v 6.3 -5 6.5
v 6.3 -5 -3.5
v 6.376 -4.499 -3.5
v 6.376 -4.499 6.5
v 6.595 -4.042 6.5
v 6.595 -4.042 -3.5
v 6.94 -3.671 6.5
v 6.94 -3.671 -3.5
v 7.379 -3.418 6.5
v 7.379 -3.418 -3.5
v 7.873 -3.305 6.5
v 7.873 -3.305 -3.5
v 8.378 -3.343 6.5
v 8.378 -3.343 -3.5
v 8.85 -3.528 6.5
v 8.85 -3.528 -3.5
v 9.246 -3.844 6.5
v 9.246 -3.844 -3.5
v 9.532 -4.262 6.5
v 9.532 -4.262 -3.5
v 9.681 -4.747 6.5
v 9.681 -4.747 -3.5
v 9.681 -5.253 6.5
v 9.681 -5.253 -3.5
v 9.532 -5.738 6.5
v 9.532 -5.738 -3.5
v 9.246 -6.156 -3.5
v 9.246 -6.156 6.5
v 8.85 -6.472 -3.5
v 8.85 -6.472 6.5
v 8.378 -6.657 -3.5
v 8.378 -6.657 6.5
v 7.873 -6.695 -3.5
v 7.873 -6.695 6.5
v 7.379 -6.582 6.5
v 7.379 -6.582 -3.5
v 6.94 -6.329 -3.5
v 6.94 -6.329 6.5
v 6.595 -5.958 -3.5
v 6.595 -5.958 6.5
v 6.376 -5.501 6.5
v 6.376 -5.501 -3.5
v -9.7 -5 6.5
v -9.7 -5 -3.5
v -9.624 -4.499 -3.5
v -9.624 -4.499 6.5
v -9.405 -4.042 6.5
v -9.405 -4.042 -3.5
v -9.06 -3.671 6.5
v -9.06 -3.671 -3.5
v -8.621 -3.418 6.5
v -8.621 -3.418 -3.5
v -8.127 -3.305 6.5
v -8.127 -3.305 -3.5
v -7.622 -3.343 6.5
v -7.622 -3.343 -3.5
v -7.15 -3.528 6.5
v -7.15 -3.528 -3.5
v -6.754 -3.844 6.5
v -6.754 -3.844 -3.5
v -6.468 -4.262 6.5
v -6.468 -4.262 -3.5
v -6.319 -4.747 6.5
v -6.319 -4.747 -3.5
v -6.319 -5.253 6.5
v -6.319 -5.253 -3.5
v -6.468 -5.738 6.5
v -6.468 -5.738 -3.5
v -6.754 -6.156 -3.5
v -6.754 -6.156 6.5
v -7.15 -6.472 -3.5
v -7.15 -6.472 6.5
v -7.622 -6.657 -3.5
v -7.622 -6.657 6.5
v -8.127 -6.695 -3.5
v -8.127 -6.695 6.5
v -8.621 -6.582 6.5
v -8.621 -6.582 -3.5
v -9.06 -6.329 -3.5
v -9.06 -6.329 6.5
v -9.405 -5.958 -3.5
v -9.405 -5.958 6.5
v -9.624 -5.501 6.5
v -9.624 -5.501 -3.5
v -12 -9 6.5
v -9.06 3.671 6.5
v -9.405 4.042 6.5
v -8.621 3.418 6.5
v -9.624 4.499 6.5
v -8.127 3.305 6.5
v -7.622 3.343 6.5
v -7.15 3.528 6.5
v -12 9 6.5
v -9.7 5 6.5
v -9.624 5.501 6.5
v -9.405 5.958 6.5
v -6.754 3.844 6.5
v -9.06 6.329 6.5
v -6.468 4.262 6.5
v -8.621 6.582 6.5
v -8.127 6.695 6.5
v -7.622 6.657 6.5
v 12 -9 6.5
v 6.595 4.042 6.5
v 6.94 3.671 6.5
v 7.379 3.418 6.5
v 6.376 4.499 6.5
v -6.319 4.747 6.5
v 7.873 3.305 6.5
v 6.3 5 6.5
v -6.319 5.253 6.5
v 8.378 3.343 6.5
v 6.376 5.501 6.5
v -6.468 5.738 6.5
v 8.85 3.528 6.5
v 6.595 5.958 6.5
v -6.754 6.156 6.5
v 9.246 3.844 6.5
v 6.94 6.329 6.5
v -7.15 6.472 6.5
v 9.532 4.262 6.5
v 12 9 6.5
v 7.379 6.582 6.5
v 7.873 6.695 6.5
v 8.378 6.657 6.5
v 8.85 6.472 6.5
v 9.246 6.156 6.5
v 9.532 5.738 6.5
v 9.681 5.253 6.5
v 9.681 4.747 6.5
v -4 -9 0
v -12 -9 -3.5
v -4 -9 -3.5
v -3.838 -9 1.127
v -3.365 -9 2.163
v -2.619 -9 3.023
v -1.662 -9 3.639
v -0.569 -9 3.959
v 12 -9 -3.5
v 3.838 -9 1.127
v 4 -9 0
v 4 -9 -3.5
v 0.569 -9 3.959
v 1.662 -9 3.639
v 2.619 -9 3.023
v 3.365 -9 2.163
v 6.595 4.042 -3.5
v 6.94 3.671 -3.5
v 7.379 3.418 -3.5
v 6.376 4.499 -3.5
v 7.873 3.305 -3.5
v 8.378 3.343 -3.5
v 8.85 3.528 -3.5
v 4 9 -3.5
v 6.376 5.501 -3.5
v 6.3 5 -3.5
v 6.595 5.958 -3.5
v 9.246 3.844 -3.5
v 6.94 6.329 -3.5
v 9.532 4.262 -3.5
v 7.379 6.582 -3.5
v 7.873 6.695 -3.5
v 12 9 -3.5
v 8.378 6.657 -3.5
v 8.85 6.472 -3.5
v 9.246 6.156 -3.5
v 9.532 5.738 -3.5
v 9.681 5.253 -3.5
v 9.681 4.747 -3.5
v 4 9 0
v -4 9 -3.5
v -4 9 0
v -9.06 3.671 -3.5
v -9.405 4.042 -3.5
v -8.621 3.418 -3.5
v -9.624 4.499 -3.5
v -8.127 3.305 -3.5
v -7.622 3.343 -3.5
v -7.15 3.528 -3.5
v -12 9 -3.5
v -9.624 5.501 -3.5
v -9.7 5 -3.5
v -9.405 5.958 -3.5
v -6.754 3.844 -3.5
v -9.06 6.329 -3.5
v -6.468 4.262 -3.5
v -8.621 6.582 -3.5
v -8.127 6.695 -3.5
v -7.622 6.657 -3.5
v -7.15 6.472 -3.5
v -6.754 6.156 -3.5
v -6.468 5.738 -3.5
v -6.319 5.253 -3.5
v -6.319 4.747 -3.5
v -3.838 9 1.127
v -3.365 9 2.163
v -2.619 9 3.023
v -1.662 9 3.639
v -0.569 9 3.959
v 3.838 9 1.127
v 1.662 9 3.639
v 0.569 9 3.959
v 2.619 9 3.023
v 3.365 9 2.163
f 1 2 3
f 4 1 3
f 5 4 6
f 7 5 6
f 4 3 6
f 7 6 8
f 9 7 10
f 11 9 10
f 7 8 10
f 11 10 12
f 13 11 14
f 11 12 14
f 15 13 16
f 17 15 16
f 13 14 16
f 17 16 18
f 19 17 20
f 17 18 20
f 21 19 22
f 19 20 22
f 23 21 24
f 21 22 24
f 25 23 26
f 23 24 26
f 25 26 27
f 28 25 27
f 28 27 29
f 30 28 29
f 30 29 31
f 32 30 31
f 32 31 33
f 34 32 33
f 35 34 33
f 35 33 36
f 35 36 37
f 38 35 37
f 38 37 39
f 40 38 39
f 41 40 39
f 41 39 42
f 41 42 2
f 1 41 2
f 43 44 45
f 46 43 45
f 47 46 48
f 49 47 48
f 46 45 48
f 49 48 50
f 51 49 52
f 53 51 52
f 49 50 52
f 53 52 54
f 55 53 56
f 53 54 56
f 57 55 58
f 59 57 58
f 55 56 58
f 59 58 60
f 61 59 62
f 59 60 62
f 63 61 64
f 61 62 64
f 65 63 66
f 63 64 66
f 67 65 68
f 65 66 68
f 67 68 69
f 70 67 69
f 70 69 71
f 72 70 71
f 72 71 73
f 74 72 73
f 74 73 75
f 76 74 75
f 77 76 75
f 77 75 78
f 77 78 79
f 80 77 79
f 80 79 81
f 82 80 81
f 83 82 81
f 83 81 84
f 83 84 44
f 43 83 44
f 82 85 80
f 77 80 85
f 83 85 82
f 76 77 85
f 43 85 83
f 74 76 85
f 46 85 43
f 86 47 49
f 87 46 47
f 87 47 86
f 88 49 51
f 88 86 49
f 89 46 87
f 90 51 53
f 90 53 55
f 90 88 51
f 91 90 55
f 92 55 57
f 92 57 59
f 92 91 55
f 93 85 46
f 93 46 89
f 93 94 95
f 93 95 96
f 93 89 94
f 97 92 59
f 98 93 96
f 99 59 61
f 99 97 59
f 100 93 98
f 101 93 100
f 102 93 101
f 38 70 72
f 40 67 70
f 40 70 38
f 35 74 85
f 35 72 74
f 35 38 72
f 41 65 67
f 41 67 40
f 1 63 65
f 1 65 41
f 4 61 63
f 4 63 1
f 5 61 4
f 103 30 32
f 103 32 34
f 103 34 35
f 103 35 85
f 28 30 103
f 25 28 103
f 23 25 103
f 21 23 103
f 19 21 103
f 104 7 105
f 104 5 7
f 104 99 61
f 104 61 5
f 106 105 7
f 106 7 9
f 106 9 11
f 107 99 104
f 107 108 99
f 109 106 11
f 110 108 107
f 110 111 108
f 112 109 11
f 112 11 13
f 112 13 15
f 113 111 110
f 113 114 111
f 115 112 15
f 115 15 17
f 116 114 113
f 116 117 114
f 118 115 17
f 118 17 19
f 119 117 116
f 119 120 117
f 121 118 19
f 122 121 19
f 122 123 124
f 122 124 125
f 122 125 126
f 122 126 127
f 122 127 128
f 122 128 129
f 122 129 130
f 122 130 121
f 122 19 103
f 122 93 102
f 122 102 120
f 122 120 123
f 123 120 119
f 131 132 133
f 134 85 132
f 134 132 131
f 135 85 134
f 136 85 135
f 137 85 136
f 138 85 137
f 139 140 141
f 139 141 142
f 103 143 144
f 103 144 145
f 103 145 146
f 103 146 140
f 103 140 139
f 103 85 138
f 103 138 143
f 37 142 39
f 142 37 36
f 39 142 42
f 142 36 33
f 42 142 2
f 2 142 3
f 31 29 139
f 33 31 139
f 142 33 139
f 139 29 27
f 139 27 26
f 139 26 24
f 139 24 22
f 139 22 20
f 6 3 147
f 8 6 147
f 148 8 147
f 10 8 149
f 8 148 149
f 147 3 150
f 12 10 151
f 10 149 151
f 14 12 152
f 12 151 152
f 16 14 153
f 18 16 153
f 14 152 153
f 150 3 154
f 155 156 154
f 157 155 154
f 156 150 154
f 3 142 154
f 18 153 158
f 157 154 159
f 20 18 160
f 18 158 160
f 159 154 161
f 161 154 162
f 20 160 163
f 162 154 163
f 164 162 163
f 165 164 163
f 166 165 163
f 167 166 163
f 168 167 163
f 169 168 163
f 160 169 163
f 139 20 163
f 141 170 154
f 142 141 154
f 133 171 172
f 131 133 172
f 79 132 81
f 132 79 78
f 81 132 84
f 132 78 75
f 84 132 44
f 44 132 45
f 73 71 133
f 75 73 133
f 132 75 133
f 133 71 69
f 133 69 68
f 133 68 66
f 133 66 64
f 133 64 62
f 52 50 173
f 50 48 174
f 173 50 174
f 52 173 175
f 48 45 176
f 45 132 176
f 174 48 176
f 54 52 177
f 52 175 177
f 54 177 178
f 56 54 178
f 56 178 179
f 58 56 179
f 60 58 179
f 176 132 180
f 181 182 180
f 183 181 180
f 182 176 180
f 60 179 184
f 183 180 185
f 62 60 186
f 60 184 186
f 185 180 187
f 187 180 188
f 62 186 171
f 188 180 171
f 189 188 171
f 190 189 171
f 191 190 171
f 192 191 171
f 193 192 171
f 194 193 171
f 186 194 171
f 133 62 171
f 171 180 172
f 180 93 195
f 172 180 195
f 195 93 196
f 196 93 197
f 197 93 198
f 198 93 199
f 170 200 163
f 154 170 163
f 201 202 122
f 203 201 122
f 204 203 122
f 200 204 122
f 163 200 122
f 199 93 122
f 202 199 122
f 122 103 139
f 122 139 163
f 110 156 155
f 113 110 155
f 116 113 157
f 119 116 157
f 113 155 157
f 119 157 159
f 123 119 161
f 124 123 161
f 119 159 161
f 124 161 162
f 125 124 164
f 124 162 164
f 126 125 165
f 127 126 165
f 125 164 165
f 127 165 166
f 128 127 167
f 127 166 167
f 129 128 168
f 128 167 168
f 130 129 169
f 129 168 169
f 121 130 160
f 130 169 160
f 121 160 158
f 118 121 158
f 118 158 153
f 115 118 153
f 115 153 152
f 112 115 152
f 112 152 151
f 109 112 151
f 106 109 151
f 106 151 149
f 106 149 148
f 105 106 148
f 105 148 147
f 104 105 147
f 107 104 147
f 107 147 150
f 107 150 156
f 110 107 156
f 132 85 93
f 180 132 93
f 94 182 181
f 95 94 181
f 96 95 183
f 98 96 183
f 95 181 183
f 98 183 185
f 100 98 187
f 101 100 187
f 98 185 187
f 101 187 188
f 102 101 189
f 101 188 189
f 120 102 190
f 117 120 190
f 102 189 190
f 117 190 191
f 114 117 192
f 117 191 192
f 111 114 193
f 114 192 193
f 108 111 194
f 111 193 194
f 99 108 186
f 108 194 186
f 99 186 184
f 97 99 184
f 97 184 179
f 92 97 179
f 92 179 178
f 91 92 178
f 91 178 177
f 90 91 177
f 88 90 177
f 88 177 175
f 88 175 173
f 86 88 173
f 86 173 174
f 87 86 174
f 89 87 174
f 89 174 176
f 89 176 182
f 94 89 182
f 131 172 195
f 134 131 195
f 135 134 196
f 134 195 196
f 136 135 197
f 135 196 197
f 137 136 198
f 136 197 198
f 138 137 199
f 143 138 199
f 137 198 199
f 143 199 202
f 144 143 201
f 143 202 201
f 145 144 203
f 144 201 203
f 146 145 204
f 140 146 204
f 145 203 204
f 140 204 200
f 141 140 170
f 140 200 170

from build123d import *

# Parameters (mm, degrees)
SKETCH1_W           = 24
SKETCH1_H           = 18
BOSS_EXTRUDE1_DEPTH = 10
CUT_EXTRUDE1_DEPTH  = 23.588713996
HOLE1_D             = 3.4
HOLE2_D             = 3.4
HOLE3_D             = 3.4
HOLE4_D             = 3.4


with BuildPart() as part:
    # Sketch1 → Boss-Extrude1 (new body)
    with BuildSketch(Plane.XY.offset(6.5)):
        Rectangle(SKETCH1_W, SKETCH1_H)
    extrude(amount=-BOSS_EXTRUDE1_DEPTH)

    # Sketch2 → Cut-Extrude1 (cut, through all)
    with BuildSketch(Plane(origin=(0, 9, 0), x_dir=(-1, 0, 0), z_dir=(0, 1, 0))):
        with BuildLine():
            Line((-4, -3.5), (4, -3.5))
            Line((4, -3.5), (4, 0))
            ThreePointArc((4, 0), (0, 4), (-4, 0))
            Line((-4, 0), (-4, -3.5))
        make_face()
    extrude(amount=-CUT_EXTRUDE1_DEPTH, mode=Mode.SUBTRACT)

    # Hole1 (through all)
    with Locations(Plane.XY.offset(6.5)):
        with Locations((8, -5)):
            Hole(HOLE1_D / 2)

    # Hole2 (through all)
    with Locations(Plane.XY.offset(6.5)):
        with Locations((-8, 5)):
            Hole(HOLE2_D / 2)

    # Hole3 (through all)
    with Locations(Plane.XY.offset(6.5)):
        with Locations((-8, -5)):
            Hole(HOLE3_D / 2)

    # Hole4 (through all)
    with Locations(Plane.XY.offset(6.5)):
        with Locations((8, 5)):
            Hole(HOLE4_D / 2)


solid = part.part
